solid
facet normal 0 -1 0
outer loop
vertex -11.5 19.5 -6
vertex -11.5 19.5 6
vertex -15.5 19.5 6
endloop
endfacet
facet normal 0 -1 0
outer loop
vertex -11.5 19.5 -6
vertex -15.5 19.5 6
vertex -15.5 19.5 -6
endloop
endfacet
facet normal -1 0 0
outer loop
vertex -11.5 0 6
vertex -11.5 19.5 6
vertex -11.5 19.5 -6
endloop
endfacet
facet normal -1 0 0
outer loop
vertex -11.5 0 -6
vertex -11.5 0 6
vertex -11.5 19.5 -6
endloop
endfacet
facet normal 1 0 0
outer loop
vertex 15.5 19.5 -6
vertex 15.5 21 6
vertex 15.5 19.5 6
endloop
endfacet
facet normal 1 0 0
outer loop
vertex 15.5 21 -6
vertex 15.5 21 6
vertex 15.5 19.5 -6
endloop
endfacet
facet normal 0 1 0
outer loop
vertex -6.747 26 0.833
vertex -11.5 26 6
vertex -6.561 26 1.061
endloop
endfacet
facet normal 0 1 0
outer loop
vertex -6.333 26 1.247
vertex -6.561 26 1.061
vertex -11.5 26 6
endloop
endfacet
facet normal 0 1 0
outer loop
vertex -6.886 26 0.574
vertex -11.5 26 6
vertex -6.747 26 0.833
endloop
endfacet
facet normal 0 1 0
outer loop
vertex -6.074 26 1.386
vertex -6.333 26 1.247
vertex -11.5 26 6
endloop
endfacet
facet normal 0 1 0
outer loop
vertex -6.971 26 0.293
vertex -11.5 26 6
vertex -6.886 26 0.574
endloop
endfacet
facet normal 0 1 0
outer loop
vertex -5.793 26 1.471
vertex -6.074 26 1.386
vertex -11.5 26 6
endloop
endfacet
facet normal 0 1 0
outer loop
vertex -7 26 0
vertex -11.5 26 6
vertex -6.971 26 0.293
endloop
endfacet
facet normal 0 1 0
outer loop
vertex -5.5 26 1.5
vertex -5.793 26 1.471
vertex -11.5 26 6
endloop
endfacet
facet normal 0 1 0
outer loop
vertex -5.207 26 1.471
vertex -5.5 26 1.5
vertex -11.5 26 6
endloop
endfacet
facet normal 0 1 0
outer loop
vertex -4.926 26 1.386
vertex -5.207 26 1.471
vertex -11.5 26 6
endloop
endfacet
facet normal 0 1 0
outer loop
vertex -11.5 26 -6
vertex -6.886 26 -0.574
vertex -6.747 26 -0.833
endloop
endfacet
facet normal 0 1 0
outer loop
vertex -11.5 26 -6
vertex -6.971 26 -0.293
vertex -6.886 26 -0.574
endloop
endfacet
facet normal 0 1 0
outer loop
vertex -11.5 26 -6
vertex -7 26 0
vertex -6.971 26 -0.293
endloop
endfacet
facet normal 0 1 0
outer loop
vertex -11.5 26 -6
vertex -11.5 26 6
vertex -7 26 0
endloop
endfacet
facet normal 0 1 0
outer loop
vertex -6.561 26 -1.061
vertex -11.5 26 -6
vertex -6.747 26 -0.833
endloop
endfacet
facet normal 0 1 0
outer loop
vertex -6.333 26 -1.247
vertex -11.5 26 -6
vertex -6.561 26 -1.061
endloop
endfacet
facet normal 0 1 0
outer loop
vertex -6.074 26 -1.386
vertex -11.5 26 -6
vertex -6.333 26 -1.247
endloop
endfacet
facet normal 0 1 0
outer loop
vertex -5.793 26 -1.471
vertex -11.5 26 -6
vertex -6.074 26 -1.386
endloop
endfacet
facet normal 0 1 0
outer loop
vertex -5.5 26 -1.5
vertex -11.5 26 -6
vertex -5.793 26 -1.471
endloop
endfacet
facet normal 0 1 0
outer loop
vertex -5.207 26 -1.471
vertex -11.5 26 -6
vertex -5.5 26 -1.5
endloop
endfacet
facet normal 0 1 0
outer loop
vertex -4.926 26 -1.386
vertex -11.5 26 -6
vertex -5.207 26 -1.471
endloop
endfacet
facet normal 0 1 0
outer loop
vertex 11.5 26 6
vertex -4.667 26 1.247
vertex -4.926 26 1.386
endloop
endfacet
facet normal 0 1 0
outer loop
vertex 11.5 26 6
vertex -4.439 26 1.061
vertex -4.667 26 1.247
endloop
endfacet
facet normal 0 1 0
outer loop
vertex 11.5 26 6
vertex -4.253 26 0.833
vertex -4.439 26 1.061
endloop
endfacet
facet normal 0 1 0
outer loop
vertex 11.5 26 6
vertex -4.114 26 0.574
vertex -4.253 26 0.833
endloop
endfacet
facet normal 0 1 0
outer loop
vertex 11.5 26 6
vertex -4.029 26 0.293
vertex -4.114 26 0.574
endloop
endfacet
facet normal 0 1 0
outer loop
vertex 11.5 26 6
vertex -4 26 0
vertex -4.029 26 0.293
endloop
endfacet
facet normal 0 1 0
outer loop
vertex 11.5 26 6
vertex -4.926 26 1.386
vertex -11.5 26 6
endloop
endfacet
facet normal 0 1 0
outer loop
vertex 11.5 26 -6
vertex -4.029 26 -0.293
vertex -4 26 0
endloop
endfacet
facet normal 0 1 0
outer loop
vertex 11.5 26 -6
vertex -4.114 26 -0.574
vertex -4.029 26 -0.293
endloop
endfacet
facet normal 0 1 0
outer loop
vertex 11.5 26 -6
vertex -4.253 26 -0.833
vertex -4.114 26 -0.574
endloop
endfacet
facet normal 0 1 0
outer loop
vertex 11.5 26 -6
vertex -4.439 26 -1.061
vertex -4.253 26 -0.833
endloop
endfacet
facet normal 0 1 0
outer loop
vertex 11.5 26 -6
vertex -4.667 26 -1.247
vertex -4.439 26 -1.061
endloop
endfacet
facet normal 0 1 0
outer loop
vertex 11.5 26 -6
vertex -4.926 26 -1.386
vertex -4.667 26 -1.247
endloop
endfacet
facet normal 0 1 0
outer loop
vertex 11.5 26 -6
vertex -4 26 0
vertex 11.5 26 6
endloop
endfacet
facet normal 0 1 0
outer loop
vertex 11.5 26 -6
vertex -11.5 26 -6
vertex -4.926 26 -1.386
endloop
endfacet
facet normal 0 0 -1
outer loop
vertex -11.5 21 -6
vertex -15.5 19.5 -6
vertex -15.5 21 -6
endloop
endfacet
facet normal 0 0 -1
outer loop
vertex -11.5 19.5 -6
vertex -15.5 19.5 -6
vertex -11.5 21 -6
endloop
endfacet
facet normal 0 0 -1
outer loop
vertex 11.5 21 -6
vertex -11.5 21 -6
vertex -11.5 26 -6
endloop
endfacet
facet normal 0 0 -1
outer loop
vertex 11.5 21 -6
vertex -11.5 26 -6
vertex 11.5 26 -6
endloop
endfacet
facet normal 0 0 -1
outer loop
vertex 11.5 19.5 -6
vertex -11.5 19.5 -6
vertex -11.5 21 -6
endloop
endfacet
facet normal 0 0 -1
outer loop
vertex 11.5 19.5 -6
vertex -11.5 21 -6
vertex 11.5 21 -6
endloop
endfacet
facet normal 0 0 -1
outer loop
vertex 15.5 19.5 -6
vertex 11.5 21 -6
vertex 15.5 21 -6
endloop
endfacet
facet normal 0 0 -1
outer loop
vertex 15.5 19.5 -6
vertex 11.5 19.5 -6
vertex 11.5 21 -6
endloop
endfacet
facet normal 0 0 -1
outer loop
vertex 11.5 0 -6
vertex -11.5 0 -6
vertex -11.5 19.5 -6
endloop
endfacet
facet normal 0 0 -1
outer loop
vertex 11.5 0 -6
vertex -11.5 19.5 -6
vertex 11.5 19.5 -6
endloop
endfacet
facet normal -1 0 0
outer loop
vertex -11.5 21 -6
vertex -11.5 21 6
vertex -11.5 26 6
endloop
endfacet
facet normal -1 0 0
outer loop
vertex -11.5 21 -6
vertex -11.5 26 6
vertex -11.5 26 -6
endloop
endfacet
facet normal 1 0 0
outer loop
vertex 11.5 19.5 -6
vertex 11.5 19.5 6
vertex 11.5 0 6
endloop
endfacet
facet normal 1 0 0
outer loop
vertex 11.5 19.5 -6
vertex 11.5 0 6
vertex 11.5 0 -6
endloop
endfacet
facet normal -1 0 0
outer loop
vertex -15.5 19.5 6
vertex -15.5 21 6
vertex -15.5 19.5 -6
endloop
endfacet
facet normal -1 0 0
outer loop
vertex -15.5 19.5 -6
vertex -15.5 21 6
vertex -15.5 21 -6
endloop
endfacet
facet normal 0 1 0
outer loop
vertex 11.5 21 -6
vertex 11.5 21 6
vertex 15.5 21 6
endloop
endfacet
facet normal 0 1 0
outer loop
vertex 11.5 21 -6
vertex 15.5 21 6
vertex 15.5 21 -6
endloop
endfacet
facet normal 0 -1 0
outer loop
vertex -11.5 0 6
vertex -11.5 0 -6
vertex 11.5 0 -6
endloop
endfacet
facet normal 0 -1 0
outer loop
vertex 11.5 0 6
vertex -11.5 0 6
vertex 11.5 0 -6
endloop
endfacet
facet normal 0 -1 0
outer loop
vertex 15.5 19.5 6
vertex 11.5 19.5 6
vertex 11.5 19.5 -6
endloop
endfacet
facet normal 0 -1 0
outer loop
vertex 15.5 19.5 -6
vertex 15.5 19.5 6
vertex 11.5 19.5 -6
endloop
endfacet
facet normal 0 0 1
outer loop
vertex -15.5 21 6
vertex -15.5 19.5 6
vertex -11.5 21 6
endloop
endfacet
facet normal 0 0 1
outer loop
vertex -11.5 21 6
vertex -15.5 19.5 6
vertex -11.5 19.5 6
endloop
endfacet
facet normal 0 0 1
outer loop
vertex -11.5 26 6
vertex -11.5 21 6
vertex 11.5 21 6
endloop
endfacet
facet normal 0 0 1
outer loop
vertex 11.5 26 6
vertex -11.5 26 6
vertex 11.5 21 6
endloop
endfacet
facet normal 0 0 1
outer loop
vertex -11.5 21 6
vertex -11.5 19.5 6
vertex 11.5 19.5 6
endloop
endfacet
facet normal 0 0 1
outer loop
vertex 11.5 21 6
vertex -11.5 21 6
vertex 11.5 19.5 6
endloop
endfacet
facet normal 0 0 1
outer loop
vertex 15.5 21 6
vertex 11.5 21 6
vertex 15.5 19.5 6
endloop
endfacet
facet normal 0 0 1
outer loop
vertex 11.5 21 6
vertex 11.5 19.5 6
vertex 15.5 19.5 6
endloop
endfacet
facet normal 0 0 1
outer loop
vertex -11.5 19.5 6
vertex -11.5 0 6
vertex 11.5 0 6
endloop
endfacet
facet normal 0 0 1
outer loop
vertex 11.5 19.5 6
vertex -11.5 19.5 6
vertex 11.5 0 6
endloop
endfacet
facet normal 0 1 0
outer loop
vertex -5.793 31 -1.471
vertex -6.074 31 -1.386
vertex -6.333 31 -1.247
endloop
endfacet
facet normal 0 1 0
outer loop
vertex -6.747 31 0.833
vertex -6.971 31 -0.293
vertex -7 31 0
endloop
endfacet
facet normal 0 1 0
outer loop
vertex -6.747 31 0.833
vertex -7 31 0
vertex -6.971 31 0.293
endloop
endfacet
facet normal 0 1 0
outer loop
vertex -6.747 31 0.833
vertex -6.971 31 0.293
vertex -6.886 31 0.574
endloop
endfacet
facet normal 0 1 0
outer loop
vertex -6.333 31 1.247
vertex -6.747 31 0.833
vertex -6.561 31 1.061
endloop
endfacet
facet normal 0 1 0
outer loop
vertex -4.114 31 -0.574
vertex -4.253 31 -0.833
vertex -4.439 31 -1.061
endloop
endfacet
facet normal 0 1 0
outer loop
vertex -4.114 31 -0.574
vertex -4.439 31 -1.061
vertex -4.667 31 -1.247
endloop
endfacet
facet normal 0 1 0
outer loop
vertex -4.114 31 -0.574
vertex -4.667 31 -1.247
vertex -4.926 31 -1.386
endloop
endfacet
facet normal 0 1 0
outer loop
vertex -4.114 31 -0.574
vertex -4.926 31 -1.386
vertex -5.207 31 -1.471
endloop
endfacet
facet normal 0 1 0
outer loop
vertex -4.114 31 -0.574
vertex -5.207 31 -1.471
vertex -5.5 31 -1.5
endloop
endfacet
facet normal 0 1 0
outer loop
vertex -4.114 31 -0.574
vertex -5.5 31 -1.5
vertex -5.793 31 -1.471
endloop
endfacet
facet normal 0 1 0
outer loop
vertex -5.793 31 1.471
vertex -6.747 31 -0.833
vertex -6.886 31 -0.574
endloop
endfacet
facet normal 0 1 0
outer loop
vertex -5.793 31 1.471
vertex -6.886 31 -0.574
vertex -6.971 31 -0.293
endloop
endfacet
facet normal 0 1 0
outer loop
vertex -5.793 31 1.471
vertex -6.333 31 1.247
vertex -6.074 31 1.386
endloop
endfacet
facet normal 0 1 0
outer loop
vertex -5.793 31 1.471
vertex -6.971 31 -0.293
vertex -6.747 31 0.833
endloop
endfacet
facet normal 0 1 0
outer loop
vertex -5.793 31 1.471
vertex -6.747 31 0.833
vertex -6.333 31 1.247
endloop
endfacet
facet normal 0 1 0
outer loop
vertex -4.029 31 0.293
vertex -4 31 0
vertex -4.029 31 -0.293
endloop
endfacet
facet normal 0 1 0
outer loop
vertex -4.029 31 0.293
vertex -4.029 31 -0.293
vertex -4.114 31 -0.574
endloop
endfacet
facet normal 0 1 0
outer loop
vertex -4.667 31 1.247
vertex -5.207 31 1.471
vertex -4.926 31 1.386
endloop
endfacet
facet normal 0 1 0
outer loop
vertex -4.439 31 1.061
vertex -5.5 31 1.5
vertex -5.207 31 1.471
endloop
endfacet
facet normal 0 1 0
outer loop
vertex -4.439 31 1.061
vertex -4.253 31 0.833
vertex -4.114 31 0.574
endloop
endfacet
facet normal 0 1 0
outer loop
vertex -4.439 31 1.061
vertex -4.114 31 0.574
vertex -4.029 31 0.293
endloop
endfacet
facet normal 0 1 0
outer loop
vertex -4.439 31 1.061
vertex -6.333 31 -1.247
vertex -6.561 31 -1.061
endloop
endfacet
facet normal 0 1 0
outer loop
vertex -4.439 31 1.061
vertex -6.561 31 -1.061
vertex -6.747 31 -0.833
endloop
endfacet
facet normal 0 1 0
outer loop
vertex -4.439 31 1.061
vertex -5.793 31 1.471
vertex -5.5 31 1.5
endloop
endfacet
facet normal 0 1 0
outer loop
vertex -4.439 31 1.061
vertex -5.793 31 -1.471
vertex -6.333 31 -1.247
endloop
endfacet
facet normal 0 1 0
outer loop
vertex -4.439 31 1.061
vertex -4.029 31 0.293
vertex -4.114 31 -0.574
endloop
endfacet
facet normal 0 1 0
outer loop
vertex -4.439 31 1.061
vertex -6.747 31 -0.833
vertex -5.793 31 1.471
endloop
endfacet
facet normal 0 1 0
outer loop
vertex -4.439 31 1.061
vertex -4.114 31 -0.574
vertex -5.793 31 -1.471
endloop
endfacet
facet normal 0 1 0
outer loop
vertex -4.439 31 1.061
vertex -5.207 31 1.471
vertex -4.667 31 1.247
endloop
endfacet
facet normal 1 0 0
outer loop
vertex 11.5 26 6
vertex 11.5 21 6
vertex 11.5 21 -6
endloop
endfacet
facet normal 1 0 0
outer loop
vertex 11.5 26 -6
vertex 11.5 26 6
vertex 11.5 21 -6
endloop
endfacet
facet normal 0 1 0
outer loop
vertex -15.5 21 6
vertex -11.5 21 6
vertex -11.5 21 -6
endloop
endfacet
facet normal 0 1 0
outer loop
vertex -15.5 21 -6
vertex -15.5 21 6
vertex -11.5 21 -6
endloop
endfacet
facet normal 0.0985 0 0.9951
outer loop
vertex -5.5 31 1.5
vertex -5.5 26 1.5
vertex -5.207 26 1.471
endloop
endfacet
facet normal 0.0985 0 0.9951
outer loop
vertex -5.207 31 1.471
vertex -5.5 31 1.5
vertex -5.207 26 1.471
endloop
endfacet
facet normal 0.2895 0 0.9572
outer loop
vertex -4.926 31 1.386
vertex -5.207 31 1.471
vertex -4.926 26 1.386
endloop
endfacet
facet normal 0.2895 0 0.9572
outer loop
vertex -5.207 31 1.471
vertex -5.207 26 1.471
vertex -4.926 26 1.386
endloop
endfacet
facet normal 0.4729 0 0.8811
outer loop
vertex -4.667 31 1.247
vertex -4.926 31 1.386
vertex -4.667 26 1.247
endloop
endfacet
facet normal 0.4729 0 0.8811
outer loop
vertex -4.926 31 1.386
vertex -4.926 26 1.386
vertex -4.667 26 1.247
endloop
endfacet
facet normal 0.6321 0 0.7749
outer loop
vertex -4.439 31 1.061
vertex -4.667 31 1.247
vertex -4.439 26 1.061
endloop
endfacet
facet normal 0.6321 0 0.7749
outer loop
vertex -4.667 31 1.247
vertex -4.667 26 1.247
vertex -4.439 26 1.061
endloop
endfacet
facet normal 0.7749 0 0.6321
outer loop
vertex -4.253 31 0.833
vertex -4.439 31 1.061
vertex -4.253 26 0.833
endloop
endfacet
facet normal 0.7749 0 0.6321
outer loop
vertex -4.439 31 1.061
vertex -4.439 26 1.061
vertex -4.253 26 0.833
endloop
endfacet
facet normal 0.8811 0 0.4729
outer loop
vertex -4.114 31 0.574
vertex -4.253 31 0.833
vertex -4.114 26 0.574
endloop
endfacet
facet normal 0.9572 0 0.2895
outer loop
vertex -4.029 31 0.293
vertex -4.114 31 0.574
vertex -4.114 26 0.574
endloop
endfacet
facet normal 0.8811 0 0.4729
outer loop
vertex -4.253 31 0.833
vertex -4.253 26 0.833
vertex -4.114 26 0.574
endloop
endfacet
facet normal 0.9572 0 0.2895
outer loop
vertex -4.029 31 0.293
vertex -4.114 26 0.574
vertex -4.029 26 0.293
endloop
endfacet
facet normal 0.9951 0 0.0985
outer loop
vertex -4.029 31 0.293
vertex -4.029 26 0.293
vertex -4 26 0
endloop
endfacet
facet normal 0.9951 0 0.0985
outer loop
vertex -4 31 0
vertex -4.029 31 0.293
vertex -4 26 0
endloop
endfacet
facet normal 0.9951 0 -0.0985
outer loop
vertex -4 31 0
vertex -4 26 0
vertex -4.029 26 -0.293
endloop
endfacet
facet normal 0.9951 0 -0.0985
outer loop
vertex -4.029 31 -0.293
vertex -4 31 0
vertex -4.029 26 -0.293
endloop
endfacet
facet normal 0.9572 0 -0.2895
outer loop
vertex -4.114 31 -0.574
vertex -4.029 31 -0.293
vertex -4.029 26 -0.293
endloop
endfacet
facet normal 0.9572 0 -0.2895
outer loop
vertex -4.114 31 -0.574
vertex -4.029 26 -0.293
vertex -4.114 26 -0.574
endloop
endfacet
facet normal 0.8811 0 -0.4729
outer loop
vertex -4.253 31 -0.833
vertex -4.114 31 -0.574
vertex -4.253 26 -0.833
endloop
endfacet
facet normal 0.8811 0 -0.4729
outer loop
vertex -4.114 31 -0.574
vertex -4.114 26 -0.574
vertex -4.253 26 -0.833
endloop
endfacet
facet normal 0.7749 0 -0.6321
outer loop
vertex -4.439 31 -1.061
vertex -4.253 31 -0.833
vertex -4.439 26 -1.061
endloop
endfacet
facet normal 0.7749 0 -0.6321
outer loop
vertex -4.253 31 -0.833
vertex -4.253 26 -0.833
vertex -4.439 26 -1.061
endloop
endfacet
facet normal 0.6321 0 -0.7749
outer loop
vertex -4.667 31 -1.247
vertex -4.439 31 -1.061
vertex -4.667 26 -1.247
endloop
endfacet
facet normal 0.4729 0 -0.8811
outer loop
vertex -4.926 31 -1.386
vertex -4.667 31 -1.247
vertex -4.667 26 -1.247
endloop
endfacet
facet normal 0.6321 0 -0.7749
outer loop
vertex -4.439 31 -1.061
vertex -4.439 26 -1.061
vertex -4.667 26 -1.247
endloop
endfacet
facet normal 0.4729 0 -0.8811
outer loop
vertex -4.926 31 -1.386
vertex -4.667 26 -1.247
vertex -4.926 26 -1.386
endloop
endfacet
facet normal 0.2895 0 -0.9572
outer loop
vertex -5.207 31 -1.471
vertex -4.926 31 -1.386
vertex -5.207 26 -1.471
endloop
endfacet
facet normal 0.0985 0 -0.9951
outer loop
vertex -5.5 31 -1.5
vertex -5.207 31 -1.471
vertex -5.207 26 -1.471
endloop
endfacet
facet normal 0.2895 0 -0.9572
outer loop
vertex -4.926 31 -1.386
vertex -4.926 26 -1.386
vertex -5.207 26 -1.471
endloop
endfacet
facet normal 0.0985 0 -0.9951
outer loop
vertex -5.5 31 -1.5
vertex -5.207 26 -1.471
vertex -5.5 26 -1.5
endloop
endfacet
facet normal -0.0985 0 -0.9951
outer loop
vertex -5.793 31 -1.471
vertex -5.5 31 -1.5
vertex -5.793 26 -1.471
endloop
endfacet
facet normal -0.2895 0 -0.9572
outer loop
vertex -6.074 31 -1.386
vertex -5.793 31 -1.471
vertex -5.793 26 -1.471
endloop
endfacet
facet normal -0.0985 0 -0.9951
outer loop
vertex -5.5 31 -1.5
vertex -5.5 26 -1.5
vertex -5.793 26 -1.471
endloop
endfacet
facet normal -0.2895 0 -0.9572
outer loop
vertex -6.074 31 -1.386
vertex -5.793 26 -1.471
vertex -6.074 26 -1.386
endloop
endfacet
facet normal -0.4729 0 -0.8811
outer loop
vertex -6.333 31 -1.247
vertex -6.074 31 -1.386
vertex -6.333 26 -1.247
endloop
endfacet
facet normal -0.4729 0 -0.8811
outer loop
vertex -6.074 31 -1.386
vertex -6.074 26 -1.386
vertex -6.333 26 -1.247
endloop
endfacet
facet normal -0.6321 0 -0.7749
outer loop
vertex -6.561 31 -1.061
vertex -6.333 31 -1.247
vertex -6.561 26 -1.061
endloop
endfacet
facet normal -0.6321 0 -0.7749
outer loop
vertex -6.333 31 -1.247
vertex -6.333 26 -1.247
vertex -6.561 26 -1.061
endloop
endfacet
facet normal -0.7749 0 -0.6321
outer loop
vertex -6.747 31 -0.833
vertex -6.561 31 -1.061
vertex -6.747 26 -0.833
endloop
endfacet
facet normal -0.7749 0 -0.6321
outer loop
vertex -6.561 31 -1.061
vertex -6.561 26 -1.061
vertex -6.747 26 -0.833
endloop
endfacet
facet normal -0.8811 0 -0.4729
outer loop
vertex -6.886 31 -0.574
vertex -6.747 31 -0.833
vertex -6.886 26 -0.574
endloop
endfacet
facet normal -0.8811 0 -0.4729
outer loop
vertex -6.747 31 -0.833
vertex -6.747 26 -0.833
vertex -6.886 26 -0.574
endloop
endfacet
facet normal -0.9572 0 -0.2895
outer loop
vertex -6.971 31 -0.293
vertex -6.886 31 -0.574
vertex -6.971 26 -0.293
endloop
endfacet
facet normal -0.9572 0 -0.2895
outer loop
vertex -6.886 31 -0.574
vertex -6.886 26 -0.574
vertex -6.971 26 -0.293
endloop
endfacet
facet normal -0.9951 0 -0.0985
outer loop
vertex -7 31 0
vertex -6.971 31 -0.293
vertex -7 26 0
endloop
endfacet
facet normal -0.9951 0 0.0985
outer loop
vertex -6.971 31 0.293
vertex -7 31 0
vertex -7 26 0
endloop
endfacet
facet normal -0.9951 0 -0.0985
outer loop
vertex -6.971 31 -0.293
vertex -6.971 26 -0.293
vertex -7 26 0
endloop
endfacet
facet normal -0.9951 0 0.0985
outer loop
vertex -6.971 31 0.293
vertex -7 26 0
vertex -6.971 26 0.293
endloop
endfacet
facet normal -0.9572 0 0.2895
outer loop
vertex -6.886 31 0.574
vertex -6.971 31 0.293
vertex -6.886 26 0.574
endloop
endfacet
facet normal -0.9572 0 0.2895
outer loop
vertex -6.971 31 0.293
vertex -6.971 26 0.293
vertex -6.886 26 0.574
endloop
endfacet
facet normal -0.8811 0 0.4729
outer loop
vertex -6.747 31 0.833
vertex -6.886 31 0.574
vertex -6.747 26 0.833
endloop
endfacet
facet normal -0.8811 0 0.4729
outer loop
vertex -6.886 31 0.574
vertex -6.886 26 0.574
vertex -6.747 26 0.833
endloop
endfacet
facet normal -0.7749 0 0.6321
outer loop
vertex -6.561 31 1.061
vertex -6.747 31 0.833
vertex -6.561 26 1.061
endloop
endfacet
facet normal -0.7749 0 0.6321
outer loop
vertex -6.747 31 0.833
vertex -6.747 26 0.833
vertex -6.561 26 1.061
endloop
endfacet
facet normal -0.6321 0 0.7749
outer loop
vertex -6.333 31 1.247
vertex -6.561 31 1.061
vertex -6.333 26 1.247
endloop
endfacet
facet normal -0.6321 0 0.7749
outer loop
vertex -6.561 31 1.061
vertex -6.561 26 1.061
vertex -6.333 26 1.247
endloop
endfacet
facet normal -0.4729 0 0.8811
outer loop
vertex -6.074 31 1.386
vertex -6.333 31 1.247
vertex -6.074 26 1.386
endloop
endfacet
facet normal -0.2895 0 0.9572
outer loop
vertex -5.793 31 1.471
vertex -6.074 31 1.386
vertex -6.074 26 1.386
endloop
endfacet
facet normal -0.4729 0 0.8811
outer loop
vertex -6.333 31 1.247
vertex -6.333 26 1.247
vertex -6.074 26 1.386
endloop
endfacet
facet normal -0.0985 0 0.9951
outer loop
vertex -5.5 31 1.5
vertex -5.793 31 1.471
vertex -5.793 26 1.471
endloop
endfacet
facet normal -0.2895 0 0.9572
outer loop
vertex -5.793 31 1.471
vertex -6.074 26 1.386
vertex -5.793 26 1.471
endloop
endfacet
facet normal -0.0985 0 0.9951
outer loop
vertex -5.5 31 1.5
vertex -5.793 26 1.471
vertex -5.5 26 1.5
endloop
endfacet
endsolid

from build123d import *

# Parameters (mm, degrees)
SKETCH1_W           = 23
SKETCH1_H           = 12
BOSS_EXTRUDE1_DEPTH = 26
SKETCH2_W           = 12
SKETCH2_H           = 1.5
BOSS_EXTRUDE2_DEPTH = 4
SKETCH3_R           = 1.5
BOSS_EXTRUDE3_DEPTH = 5


with BuildPart() as part:
    # Sketch1 → Boss-Extrude1 (new body)
    with BuildSketch(Plane(origin=(0, 0, 0), x_dir=(1, 0, 0), z_dir=(0, 1, 0))):
        Rectangle(SKETCH1_W, SKETCH1_H)
    extrude(amount=BOSS_EXTRUDE1_DEPTH)

    # Sketch2 → Boss-Extrude2 (add)
    with BuildSketch(Plane(origin=(11.5, 0, 0), x_dir=(0, 0, -1), z_dir=(1, 0, 0))):
        with Locations((0, 20.25)):
            Rectangle(SKETCH2_W, SKETCH2_H)
    boss_extrude2 = extrude(amount=BOSS_EXTRUDE2_DEPTH)

    # Mirror1: Boss-Extrude2 across plane
    add(boss_extrude2.mirror(Plane(origin=(0, 0, 0), x_dir=(0, 0, 1), z_dir=(1, 0, 0))))

    # Sketch3 → Boss-Extrude3 (add)
    with BuildSketch(Plane(origin=(0, 26, 0), x_dir=(1, 0, 0), z_dir=(0, 1, 0))):
        with Locations(Location((-5.5, 0, 0), (0, 0, 270))):
            Circle(SKETCH3_R)
    extrude(amount=BOSS_EXTRUDE3_DEPTH)


solid = part.part
